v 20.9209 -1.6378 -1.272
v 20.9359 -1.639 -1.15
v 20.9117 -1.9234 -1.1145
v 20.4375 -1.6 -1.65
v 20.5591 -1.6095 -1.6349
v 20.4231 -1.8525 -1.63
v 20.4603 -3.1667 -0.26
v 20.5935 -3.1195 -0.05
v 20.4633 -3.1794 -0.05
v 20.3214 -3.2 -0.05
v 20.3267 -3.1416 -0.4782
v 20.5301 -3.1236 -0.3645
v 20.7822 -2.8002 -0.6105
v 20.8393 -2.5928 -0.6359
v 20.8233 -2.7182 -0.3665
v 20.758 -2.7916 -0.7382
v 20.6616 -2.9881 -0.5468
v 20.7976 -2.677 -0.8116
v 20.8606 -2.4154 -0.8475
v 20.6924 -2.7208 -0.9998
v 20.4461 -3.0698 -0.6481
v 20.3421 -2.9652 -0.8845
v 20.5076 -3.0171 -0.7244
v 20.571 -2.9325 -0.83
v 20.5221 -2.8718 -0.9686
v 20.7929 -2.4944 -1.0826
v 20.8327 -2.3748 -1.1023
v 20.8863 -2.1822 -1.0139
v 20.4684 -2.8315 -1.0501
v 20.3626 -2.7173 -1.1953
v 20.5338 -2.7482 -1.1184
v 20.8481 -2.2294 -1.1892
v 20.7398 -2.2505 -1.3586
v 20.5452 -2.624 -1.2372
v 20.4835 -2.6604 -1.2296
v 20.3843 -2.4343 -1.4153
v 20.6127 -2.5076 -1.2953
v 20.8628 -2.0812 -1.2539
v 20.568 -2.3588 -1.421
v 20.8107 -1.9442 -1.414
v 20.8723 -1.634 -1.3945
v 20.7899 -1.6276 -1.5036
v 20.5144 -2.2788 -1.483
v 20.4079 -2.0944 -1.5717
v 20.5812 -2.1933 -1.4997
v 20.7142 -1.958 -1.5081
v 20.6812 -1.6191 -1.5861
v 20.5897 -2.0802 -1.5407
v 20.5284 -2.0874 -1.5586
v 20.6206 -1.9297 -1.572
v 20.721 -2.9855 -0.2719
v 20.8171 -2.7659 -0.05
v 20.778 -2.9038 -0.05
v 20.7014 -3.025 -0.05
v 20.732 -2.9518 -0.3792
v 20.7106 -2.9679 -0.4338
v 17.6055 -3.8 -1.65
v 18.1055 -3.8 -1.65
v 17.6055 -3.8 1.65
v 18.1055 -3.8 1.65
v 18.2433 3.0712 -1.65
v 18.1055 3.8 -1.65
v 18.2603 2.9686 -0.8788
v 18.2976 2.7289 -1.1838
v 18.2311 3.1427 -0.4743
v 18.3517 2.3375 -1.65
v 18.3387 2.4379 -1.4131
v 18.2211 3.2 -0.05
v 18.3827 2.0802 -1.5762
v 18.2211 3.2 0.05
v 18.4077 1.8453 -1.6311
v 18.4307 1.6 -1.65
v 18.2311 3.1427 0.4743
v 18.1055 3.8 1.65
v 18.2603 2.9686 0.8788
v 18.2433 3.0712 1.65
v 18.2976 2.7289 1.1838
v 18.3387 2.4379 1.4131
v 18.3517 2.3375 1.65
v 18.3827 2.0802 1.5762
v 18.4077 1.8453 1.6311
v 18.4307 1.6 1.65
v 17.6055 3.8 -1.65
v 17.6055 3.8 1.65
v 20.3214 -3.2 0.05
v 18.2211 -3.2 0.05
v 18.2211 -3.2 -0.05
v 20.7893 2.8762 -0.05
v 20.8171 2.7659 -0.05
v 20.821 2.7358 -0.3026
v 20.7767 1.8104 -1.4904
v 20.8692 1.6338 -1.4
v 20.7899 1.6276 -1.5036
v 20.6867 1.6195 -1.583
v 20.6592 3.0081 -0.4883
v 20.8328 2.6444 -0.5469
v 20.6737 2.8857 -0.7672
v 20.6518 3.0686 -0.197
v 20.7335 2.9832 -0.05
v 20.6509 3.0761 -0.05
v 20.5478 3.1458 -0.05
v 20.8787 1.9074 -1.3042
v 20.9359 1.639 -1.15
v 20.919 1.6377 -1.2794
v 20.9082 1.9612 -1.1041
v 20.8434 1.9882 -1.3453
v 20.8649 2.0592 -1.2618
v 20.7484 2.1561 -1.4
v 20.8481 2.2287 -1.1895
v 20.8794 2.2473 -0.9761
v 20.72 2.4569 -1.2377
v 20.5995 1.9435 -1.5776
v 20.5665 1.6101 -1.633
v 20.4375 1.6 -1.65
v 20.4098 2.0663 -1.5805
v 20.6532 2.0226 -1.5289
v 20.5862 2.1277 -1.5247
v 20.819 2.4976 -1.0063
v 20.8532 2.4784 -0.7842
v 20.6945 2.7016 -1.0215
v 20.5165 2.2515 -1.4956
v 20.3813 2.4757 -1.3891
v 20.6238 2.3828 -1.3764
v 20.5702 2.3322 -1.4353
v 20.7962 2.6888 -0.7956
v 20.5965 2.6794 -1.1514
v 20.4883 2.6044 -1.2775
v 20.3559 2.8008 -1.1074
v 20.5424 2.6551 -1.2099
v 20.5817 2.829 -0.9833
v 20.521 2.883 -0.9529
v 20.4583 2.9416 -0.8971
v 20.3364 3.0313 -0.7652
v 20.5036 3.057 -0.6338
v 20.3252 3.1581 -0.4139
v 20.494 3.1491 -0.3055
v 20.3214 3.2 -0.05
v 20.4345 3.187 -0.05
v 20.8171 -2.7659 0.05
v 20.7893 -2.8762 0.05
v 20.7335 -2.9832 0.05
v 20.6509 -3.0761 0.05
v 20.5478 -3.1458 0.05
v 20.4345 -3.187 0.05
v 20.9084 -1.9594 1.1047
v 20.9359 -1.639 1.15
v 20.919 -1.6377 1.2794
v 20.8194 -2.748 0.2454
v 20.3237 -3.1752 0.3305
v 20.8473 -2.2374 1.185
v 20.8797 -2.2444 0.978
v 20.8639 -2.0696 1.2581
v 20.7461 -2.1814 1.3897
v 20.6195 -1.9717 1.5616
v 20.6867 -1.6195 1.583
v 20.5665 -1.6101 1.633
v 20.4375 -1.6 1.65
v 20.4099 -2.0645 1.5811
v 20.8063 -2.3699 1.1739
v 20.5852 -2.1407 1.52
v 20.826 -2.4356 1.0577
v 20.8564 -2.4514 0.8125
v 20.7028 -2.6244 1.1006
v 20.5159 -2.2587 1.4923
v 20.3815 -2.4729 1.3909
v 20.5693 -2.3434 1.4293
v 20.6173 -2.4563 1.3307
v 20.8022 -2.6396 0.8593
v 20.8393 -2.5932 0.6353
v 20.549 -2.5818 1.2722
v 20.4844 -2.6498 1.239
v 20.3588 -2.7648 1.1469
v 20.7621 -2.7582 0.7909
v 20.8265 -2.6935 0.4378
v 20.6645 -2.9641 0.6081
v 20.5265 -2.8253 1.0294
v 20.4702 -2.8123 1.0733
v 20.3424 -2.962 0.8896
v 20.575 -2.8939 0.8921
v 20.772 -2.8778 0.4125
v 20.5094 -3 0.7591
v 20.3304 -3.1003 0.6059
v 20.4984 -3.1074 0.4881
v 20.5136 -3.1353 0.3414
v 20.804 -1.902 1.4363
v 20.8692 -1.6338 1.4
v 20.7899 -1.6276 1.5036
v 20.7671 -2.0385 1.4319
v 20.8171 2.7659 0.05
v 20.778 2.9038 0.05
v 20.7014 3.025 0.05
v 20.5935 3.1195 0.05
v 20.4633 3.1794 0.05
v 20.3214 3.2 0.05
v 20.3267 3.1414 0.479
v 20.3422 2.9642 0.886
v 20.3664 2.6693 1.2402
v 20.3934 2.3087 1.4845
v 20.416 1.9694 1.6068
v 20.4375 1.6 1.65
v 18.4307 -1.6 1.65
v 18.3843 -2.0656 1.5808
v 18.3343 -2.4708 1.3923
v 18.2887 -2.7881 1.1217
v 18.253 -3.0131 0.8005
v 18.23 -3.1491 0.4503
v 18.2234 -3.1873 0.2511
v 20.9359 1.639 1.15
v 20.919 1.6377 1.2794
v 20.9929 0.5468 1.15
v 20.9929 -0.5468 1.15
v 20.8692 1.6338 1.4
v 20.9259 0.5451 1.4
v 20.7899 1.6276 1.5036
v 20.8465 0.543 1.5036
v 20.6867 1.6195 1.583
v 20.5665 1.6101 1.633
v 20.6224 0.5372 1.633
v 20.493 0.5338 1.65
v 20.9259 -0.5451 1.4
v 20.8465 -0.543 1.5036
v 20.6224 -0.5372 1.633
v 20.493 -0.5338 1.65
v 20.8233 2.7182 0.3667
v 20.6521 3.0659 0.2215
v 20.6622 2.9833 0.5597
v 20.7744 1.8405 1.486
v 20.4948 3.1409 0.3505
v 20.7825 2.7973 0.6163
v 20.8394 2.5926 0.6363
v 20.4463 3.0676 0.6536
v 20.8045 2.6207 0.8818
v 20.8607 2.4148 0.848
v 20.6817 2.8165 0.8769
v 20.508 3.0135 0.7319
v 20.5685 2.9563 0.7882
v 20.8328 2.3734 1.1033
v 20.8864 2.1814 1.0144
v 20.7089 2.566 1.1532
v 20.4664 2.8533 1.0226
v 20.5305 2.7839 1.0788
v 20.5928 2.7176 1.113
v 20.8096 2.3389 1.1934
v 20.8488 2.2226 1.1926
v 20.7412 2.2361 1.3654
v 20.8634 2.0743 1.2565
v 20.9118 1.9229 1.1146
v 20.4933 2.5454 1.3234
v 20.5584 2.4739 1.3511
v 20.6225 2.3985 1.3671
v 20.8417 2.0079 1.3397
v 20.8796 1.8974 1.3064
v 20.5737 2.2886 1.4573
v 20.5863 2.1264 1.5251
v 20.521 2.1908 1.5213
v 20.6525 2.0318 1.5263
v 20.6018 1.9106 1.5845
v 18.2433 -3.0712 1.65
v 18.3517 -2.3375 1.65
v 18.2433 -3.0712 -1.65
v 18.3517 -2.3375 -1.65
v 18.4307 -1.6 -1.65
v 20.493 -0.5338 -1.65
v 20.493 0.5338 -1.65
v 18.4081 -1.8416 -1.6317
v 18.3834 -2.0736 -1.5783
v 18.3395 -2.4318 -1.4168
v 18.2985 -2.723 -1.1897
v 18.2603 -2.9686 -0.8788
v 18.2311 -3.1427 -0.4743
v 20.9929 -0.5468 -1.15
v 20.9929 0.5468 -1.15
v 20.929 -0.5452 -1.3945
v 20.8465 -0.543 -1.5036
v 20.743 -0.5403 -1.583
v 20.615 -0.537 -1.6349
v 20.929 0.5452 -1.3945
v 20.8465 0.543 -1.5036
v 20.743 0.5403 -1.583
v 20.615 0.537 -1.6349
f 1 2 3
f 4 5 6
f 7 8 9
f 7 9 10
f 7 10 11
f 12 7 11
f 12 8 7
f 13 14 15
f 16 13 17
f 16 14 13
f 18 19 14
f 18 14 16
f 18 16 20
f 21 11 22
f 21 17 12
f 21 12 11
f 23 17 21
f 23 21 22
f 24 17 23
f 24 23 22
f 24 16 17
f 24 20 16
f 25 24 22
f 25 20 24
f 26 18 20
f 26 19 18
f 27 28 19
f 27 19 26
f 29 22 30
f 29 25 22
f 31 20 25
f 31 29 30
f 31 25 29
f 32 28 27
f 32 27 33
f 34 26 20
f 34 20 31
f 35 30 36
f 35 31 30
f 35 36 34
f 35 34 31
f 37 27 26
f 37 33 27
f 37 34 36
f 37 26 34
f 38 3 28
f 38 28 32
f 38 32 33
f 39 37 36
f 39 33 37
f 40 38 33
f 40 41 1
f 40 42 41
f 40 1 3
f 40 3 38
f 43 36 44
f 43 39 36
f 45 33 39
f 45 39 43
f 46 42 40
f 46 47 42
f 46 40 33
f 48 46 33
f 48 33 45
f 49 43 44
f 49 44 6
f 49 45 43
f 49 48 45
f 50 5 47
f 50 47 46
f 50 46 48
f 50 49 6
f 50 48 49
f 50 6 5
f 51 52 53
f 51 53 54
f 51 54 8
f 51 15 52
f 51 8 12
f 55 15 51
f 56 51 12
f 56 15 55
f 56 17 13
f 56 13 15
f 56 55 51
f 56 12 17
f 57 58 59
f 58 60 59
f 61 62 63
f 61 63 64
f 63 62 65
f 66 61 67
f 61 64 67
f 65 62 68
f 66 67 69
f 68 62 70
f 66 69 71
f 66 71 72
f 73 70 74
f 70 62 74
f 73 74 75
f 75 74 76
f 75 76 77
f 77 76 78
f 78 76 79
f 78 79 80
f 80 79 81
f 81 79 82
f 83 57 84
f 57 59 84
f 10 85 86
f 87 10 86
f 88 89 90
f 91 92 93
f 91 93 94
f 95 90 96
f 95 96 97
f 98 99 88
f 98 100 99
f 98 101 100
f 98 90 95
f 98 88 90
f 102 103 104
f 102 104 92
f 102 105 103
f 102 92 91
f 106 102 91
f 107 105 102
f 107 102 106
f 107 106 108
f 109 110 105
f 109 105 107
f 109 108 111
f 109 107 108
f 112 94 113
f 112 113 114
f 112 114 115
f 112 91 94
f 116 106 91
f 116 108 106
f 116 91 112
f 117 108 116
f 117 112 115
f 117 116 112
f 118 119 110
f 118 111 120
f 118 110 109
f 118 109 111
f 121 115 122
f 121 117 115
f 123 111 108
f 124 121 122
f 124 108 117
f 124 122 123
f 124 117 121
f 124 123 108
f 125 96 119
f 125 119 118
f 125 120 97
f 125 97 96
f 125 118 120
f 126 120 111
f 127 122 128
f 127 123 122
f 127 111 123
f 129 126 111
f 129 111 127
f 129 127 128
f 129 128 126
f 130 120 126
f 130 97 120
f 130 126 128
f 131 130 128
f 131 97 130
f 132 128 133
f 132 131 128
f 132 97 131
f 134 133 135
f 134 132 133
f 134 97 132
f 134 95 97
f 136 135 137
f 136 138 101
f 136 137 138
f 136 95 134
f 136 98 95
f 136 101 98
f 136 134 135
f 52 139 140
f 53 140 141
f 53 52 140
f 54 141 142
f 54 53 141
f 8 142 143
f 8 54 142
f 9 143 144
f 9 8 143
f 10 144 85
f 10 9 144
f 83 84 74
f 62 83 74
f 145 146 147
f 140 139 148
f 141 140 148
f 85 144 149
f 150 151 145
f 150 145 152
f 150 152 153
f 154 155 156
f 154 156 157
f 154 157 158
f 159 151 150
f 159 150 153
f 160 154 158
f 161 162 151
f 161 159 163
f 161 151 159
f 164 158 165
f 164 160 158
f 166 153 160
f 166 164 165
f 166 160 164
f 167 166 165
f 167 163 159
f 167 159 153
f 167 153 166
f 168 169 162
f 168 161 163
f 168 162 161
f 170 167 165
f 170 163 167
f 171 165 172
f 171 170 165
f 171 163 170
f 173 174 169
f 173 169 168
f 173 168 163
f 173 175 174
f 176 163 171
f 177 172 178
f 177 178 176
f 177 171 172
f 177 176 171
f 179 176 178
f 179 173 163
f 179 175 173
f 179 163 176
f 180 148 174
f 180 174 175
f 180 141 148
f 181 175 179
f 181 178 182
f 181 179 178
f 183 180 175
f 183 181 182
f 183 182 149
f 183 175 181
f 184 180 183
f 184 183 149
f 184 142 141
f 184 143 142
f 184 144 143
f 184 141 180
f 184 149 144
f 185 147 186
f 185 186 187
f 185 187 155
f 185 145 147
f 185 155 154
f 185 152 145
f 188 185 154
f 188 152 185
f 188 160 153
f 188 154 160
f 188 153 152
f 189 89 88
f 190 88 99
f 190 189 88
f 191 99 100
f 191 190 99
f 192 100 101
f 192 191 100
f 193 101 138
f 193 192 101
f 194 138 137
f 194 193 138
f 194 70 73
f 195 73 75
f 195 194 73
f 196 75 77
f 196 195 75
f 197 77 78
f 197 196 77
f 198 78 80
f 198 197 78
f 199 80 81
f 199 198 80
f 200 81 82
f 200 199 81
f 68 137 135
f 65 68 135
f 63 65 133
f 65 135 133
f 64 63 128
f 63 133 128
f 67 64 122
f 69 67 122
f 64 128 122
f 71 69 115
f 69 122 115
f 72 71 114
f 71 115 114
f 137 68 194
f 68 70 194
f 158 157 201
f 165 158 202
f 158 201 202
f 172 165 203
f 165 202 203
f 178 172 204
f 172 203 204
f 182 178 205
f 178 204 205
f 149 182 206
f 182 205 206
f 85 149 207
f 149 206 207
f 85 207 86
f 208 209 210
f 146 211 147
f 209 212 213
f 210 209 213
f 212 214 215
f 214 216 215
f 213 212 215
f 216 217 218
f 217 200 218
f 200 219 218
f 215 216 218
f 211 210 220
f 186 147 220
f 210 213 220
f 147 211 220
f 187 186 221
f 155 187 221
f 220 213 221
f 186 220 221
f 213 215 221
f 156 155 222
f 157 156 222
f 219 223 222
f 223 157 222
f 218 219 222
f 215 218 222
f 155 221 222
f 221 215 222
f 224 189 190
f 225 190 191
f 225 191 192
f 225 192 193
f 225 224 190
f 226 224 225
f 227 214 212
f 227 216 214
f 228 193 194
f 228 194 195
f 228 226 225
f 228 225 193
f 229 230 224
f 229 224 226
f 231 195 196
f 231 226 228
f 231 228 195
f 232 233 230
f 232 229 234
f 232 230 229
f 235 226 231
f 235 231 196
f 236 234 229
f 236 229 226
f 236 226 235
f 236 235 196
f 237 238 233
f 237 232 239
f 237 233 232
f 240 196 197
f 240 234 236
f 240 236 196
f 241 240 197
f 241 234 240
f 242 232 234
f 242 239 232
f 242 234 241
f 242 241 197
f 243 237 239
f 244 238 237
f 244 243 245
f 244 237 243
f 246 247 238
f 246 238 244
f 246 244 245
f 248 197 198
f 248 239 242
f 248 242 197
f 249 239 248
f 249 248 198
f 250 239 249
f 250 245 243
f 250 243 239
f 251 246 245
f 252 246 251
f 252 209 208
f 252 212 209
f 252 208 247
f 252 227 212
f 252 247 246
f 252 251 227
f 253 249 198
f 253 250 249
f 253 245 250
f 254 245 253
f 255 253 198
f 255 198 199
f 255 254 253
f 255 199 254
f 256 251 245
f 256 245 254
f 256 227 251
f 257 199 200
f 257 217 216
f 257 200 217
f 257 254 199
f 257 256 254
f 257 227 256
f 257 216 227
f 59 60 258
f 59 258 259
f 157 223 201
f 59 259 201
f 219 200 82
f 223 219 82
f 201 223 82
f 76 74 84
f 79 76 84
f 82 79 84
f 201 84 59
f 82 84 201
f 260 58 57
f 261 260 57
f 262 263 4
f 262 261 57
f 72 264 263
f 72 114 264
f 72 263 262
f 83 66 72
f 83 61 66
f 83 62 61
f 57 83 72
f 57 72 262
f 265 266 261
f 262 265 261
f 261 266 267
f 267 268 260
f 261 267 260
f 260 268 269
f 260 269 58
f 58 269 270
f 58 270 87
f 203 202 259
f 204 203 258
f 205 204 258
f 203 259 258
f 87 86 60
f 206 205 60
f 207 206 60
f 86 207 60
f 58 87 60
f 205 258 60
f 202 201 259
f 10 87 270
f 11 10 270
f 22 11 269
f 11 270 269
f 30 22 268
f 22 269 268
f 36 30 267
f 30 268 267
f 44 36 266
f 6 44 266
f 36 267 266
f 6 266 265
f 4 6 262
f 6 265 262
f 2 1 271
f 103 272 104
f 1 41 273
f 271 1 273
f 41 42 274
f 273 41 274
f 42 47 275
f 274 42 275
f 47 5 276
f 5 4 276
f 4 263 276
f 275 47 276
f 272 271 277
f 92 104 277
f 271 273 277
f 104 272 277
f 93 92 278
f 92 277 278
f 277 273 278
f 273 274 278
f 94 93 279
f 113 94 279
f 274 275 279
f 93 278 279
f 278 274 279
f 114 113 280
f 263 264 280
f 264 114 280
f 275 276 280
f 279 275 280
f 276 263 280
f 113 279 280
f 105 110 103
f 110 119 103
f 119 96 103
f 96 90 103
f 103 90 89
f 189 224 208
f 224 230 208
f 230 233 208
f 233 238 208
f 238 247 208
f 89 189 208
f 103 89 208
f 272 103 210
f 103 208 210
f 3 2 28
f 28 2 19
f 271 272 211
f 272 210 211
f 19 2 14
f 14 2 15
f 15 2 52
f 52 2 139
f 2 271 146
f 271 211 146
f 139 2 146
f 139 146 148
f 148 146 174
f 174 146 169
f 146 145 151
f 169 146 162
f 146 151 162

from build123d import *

# Parameters (mm, degrees)
BOSS_EXTRUDE1_DEPTH = 1.65
FILLET1_R           = 1.6
FILLET2_R           = 0.5


with BuildPart() as part:
    # Sketch1 → Boss-Extrude1 (new, symmetric)
    with BuildSketch(Plane.XY):
        with BuildLine():
            Line((18.221141567, 3.2), (20.754758491, 3.2))
            ThreePointArc((20.754758491, 3.2), (21, 0), (20.754758491, -3.2))
            Line((20.754758491, -3.2), (18.221141567, -3.2))
            ThreePointArc((18.221141567, -3.2), (18.165810143, -3.500477375), (18.105524019, -3.8))
            Line((18.105524019, -3.8), (17.605524019, -3.8))
            Line((17.605524019, -3.8), (17.605524019, 3.8))
            Line((17.605524019, 3.8), (18.105524019, 3.8))
            ThreePointArc((18.105524019, 3.8), (18.165810143, 3.500477375), (18.221141567, 3.2))
        make_face()
    extrude(amount=BOSS_EXTRUDE1_DEPTH, both=True)

    # Fillet1
    fillet1_edges = [part.edges().sort_by_distance(p)[0] for p in [
        (19.487950029, 3.2, -1.65),
        (19.487950029, -3.2, 1.65),
        (19.487950029, 3.2, 1.65),
        (19.487950029, -3.2, -1.65),
    ]]
    fillet(fillet1_edges, radius=FILLET1_R)

    # Fillet2
    fillet2_edges = [part.edges().sort_by_distance(p)[0] for p in [
        (21, 0, 1.65),
        (21, 0, -1.65),
        (20.754758491, 3.2, 0),
        (20.754758491, -3.2, 0),
        (20.821763727, 2.730229949, 1.182510681),
        (20.821763726, 2.730229907, -1.182510644),
        (20.821763721, -2.730229944, -1.182510607),
        (20.821763721, -2.730229942, 1.182510608),
    ]]
    fillet(fillet2_edges, radius=FILLET2_R)


solid = part.part
